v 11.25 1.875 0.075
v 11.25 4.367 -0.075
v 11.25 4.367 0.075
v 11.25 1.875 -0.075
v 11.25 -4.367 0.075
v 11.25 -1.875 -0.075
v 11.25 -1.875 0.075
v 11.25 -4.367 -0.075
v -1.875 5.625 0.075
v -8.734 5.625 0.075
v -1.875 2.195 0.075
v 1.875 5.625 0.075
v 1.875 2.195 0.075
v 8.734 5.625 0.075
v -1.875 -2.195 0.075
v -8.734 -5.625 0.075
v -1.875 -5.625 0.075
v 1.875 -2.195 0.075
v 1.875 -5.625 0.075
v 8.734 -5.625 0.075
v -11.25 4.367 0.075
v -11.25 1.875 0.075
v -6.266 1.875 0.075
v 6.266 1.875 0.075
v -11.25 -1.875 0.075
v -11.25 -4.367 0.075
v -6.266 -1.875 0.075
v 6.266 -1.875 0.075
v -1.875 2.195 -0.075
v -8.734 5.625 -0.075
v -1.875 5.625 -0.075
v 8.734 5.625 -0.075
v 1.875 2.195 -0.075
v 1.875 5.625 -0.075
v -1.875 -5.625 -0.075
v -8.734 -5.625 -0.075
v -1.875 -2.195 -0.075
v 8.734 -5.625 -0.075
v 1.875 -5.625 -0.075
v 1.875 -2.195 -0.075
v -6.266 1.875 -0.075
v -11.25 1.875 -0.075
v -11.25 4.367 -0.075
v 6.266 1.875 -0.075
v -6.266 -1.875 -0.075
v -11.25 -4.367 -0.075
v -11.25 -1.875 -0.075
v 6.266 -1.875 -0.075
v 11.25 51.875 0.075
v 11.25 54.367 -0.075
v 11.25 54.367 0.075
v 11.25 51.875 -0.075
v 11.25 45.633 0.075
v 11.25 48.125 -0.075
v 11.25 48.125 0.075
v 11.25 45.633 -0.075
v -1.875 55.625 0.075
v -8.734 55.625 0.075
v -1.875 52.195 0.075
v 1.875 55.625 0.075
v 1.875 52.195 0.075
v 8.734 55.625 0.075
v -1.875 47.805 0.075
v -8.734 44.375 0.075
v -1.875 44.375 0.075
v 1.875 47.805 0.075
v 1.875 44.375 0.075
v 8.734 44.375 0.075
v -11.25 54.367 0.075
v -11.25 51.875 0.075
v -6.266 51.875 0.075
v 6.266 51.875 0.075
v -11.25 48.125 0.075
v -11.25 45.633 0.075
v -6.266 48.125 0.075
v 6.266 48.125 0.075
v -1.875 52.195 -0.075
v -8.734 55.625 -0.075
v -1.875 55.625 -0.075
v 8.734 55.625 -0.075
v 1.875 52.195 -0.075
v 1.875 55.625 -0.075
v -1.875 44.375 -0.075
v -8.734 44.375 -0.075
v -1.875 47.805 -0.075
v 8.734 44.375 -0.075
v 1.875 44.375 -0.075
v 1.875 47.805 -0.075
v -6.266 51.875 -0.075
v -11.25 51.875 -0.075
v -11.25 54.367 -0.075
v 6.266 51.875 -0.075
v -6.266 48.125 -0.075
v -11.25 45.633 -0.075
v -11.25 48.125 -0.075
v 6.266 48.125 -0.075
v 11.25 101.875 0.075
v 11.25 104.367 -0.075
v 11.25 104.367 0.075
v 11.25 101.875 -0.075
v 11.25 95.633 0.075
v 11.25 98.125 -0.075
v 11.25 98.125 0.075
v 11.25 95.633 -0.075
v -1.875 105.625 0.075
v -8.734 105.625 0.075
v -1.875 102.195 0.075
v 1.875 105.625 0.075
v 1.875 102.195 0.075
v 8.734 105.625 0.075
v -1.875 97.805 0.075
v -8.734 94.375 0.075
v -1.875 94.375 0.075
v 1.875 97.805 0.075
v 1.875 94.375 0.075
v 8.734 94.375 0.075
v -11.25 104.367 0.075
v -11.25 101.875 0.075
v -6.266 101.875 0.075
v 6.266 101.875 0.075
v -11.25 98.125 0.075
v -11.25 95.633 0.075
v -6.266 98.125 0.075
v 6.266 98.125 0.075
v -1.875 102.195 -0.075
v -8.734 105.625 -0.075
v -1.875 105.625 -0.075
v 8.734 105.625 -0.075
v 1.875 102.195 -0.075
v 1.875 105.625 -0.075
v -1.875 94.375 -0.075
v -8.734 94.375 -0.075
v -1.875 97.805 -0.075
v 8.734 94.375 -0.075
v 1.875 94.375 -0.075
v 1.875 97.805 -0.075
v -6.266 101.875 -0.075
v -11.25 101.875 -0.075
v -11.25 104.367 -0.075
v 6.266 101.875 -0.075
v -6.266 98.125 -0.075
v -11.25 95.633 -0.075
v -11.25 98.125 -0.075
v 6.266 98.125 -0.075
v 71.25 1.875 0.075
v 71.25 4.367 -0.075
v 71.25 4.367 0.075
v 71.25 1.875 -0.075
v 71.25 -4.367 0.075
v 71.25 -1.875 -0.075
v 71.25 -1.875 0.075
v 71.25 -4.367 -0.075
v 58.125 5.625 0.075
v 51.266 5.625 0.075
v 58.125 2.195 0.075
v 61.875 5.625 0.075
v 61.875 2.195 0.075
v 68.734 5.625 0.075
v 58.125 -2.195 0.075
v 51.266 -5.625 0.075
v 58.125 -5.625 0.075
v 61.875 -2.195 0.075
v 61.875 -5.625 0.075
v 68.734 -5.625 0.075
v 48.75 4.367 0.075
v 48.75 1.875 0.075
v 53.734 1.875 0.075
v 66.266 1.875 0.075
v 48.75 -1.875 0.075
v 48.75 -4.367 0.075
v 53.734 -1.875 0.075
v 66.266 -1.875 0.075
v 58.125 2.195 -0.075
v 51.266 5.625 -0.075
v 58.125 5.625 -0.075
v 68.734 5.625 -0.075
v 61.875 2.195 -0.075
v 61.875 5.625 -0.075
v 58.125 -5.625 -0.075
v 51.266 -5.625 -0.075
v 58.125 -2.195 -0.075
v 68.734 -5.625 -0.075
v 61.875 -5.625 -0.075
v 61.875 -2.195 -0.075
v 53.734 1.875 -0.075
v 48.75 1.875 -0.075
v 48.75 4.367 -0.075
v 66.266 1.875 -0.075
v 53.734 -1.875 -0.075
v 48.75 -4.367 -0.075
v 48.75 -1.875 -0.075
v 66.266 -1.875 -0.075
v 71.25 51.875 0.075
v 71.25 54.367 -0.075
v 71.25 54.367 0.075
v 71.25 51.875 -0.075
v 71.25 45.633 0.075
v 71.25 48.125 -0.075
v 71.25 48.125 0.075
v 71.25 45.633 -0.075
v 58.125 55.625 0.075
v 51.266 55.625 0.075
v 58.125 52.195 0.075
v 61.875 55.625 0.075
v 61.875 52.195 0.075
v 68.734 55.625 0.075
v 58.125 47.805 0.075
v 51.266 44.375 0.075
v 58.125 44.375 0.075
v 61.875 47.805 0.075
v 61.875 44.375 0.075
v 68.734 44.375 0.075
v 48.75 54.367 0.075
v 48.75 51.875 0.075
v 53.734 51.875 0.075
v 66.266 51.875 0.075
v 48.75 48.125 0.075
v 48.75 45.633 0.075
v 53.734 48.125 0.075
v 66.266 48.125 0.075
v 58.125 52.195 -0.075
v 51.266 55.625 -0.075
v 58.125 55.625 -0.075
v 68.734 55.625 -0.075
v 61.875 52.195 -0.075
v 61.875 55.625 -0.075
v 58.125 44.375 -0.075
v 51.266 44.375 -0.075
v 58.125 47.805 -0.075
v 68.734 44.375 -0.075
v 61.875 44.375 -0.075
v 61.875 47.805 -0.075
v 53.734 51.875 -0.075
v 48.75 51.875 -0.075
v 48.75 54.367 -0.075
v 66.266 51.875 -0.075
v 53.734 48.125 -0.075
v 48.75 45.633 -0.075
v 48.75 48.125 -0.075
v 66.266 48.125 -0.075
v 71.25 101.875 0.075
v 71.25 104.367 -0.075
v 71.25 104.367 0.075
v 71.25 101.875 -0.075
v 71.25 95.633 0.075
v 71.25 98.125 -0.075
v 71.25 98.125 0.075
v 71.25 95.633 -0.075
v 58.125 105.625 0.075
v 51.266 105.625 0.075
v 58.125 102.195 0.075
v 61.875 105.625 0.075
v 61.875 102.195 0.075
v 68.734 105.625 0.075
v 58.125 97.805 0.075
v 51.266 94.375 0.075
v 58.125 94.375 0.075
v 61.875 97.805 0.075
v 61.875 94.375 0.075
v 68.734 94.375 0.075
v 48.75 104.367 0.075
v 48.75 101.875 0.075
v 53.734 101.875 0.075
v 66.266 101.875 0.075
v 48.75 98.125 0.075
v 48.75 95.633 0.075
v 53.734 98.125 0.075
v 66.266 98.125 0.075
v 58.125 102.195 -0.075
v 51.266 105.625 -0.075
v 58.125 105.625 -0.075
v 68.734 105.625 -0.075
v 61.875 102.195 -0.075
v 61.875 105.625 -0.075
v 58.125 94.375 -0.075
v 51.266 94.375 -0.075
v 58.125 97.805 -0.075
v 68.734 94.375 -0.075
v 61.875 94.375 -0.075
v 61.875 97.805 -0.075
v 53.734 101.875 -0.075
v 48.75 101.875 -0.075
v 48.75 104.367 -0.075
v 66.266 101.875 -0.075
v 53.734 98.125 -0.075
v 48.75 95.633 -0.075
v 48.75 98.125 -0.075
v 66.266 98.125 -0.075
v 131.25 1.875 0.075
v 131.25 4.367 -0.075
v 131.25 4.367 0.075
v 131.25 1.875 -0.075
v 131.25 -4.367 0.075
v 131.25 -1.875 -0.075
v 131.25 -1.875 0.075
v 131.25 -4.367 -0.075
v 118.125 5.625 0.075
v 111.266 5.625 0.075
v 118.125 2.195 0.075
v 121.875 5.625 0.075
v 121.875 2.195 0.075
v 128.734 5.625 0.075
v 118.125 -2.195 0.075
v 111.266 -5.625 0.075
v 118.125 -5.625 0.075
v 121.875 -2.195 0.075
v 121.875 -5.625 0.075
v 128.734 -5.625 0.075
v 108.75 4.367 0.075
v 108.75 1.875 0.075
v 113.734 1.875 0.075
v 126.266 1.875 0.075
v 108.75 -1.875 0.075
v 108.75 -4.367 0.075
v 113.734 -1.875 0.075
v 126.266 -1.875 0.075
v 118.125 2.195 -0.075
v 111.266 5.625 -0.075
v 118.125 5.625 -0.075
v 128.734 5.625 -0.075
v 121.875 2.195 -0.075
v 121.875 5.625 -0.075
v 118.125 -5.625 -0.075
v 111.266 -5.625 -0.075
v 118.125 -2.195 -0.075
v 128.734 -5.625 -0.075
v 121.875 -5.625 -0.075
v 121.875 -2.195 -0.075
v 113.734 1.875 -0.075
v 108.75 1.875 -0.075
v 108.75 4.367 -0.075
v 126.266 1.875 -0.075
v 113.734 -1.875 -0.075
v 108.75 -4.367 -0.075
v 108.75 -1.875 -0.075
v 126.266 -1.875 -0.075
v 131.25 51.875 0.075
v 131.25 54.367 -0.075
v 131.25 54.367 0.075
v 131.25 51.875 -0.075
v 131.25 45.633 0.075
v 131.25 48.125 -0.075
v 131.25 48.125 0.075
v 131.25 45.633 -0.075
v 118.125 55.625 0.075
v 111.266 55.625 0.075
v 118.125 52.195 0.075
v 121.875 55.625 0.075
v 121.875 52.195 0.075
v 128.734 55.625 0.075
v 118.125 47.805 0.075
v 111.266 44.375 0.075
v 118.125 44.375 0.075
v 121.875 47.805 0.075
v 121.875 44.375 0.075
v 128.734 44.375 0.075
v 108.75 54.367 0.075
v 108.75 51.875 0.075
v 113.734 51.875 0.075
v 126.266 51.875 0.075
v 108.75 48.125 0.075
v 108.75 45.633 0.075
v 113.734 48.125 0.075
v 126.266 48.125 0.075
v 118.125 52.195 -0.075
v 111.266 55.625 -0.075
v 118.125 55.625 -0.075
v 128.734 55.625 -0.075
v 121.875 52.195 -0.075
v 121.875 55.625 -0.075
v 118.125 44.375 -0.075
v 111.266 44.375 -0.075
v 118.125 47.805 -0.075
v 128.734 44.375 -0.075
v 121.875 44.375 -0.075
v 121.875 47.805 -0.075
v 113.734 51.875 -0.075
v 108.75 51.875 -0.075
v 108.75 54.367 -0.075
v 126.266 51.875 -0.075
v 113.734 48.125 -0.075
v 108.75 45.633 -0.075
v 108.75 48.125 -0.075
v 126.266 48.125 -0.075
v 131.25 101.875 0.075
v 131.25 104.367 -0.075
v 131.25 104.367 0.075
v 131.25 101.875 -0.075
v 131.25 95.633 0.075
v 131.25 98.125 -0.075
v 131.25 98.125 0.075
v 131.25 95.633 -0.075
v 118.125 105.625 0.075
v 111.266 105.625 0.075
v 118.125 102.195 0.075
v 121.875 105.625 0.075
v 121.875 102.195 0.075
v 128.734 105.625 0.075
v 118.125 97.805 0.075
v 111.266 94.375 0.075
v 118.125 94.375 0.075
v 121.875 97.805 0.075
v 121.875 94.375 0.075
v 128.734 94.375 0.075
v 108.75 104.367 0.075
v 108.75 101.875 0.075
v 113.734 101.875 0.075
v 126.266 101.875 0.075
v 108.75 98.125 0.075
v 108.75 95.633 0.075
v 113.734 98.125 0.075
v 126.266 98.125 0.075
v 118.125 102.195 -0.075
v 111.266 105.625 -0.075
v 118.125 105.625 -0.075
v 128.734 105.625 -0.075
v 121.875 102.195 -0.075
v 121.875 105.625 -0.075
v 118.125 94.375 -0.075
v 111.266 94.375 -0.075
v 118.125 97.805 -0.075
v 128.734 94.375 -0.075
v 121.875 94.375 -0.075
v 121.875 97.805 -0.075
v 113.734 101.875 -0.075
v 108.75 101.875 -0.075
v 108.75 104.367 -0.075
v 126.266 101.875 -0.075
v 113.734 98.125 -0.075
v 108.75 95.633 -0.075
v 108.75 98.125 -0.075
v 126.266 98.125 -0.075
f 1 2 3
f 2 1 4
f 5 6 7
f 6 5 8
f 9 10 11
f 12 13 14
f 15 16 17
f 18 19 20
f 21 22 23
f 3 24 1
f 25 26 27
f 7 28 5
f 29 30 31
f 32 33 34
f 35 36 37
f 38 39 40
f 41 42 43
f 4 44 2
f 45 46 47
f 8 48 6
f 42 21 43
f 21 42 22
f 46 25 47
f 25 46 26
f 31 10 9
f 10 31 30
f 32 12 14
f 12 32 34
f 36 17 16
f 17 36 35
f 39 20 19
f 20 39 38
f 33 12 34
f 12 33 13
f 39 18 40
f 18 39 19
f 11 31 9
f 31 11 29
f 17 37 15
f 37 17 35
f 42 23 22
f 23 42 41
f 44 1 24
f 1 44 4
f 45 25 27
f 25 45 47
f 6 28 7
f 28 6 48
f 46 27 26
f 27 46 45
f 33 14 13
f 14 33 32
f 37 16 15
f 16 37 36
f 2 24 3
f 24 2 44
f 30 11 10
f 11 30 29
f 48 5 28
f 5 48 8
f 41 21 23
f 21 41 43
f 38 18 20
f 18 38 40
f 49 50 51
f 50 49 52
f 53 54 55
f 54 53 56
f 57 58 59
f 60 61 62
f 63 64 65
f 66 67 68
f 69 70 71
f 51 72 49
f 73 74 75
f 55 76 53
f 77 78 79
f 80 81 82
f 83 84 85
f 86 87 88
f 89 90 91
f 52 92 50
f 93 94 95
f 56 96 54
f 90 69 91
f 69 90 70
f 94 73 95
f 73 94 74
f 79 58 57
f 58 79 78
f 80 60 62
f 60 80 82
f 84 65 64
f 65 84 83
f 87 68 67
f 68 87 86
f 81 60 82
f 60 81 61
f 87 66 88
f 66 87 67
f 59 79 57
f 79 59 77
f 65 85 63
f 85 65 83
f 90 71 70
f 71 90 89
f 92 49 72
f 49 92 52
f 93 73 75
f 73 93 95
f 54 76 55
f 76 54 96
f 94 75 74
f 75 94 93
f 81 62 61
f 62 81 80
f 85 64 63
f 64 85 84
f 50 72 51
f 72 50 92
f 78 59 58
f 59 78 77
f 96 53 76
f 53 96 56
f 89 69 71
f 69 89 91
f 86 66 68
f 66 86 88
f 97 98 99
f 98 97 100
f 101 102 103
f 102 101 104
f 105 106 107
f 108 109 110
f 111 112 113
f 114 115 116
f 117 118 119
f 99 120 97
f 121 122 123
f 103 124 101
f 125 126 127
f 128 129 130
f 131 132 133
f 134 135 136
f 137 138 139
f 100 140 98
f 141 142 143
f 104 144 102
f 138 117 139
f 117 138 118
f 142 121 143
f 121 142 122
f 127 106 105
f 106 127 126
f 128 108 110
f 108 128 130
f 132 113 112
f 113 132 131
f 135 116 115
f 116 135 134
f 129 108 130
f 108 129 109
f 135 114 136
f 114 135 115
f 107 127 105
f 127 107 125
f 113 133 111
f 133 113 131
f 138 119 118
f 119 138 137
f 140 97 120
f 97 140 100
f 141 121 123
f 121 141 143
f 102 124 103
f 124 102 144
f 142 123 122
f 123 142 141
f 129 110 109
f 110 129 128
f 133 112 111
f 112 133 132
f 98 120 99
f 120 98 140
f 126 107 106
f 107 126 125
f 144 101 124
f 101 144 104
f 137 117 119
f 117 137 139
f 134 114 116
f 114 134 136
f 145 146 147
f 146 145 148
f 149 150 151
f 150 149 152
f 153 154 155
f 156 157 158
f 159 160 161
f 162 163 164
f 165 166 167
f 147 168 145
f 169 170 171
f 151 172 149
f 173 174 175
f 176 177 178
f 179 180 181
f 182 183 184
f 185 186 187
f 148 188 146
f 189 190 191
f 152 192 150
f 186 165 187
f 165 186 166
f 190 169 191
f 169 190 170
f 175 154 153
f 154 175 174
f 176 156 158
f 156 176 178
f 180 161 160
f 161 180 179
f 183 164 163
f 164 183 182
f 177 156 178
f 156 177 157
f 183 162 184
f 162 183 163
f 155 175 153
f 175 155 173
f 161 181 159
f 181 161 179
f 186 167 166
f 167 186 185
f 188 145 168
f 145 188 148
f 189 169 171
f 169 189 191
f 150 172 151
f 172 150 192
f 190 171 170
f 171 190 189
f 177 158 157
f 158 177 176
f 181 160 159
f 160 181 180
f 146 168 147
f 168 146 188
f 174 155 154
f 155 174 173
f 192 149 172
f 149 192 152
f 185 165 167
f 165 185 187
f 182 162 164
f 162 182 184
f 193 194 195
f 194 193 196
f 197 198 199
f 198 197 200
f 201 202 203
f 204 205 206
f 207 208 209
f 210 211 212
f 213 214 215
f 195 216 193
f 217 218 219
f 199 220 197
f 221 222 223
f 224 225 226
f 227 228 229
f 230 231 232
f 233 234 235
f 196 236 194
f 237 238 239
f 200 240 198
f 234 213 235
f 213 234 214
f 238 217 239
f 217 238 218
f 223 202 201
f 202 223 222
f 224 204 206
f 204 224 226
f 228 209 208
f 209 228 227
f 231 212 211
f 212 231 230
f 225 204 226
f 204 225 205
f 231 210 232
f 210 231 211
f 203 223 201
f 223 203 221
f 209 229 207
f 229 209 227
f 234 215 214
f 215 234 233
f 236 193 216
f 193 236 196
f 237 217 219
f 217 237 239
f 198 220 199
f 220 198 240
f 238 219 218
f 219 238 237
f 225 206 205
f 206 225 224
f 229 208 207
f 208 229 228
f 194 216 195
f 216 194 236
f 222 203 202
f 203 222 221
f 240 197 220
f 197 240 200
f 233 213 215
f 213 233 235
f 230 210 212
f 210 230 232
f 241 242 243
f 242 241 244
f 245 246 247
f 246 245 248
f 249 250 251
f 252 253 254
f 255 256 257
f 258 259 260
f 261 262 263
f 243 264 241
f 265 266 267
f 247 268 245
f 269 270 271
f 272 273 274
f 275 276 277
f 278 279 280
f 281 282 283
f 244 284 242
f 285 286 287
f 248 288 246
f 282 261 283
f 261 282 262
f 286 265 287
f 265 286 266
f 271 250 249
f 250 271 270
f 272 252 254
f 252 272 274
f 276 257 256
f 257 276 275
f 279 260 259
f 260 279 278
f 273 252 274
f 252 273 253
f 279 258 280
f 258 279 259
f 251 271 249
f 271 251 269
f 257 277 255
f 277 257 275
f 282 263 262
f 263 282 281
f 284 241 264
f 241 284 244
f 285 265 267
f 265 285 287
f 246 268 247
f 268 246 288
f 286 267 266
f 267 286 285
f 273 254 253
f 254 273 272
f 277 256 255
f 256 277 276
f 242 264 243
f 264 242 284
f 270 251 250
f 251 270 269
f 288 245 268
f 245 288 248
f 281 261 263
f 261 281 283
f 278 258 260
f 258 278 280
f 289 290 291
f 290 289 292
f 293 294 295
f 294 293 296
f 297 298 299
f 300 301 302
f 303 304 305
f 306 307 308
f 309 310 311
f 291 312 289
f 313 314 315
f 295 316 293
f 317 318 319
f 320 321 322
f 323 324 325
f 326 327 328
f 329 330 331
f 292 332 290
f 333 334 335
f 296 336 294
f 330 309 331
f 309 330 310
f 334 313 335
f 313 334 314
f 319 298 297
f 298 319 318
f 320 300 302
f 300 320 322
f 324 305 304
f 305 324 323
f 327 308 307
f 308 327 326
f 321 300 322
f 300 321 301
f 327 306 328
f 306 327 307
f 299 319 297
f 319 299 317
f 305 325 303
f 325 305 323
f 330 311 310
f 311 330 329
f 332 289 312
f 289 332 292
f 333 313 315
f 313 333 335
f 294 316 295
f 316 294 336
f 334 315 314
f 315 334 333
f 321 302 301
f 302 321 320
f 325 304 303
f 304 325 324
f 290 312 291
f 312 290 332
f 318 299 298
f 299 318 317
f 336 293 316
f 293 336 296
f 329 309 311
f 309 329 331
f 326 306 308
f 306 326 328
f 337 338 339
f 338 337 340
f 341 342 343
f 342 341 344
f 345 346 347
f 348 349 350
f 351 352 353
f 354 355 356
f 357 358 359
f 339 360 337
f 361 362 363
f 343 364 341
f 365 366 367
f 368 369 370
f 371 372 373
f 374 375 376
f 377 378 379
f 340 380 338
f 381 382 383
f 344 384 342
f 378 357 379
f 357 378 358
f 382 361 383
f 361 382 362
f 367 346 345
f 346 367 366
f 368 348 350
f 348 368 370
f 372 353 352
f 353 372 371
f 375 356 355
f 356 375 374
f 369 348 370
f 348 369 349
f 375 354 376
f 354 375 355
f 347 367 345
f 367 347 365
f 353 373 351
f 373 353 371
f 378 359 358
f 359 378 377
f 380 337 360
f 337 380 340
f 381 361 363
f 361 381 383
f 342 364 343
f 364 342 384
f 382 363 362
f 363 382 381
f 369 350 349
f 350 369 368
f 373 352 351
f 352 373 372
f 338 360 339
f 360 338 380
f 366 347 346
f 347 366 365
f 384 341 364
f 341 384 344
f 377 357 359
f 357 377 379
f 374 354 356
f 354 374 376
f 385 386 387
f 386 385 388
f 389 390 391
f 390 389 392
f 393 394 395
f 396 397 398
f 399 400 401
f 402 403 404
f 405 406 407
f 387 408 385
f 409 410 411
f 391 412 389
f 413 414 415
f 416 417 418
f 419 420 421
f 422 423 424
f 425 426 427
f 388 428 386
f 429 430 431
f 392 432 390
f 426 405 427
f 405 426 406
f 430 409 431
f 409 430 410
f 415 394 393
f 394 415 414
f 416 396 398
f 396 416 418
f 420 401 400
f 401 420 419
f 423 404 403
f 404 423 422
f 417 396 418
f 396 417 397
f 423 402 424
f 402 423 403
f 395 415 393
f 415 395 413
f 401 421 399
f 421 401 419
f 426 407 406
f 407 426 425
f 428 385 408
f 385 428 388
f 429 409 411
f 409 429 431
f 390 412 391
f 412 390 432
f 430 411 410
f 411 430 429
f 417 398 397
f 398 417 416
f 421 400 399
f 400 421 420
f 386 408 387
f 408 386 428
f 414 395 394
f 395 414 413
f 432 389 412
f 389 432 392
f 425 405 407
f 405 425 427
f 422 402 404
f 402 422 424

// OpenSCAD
/*
 * Mult-material test
 *
 * Copyright 2012 <b@Zi.iS>
 * License CC BY 3.0
 *
 */
for(xxx=[0:2]) for(yyy=[0:2]) {
	translate([60*xxx,50*yyy,0])
scale(.75) {
difference() {
	cube(center=true, [
		30,
		15,
		.2,
	]);
	cube(center=true, [
		5,
		400,
		1
	]);
	cube(center=true, [
		400,
		5,
		1
	]);
	
	
	rotate([
		0,
		0,
		26.565
	]) {
		cube(center=true, [
			400,
			3,
			1
		]);
	}
	
	rotate([
		0,
		0,
		-26.565
	]) {
		cube(center=true, [
			400,
			3,
			1,
		]);
	}

}}
}
